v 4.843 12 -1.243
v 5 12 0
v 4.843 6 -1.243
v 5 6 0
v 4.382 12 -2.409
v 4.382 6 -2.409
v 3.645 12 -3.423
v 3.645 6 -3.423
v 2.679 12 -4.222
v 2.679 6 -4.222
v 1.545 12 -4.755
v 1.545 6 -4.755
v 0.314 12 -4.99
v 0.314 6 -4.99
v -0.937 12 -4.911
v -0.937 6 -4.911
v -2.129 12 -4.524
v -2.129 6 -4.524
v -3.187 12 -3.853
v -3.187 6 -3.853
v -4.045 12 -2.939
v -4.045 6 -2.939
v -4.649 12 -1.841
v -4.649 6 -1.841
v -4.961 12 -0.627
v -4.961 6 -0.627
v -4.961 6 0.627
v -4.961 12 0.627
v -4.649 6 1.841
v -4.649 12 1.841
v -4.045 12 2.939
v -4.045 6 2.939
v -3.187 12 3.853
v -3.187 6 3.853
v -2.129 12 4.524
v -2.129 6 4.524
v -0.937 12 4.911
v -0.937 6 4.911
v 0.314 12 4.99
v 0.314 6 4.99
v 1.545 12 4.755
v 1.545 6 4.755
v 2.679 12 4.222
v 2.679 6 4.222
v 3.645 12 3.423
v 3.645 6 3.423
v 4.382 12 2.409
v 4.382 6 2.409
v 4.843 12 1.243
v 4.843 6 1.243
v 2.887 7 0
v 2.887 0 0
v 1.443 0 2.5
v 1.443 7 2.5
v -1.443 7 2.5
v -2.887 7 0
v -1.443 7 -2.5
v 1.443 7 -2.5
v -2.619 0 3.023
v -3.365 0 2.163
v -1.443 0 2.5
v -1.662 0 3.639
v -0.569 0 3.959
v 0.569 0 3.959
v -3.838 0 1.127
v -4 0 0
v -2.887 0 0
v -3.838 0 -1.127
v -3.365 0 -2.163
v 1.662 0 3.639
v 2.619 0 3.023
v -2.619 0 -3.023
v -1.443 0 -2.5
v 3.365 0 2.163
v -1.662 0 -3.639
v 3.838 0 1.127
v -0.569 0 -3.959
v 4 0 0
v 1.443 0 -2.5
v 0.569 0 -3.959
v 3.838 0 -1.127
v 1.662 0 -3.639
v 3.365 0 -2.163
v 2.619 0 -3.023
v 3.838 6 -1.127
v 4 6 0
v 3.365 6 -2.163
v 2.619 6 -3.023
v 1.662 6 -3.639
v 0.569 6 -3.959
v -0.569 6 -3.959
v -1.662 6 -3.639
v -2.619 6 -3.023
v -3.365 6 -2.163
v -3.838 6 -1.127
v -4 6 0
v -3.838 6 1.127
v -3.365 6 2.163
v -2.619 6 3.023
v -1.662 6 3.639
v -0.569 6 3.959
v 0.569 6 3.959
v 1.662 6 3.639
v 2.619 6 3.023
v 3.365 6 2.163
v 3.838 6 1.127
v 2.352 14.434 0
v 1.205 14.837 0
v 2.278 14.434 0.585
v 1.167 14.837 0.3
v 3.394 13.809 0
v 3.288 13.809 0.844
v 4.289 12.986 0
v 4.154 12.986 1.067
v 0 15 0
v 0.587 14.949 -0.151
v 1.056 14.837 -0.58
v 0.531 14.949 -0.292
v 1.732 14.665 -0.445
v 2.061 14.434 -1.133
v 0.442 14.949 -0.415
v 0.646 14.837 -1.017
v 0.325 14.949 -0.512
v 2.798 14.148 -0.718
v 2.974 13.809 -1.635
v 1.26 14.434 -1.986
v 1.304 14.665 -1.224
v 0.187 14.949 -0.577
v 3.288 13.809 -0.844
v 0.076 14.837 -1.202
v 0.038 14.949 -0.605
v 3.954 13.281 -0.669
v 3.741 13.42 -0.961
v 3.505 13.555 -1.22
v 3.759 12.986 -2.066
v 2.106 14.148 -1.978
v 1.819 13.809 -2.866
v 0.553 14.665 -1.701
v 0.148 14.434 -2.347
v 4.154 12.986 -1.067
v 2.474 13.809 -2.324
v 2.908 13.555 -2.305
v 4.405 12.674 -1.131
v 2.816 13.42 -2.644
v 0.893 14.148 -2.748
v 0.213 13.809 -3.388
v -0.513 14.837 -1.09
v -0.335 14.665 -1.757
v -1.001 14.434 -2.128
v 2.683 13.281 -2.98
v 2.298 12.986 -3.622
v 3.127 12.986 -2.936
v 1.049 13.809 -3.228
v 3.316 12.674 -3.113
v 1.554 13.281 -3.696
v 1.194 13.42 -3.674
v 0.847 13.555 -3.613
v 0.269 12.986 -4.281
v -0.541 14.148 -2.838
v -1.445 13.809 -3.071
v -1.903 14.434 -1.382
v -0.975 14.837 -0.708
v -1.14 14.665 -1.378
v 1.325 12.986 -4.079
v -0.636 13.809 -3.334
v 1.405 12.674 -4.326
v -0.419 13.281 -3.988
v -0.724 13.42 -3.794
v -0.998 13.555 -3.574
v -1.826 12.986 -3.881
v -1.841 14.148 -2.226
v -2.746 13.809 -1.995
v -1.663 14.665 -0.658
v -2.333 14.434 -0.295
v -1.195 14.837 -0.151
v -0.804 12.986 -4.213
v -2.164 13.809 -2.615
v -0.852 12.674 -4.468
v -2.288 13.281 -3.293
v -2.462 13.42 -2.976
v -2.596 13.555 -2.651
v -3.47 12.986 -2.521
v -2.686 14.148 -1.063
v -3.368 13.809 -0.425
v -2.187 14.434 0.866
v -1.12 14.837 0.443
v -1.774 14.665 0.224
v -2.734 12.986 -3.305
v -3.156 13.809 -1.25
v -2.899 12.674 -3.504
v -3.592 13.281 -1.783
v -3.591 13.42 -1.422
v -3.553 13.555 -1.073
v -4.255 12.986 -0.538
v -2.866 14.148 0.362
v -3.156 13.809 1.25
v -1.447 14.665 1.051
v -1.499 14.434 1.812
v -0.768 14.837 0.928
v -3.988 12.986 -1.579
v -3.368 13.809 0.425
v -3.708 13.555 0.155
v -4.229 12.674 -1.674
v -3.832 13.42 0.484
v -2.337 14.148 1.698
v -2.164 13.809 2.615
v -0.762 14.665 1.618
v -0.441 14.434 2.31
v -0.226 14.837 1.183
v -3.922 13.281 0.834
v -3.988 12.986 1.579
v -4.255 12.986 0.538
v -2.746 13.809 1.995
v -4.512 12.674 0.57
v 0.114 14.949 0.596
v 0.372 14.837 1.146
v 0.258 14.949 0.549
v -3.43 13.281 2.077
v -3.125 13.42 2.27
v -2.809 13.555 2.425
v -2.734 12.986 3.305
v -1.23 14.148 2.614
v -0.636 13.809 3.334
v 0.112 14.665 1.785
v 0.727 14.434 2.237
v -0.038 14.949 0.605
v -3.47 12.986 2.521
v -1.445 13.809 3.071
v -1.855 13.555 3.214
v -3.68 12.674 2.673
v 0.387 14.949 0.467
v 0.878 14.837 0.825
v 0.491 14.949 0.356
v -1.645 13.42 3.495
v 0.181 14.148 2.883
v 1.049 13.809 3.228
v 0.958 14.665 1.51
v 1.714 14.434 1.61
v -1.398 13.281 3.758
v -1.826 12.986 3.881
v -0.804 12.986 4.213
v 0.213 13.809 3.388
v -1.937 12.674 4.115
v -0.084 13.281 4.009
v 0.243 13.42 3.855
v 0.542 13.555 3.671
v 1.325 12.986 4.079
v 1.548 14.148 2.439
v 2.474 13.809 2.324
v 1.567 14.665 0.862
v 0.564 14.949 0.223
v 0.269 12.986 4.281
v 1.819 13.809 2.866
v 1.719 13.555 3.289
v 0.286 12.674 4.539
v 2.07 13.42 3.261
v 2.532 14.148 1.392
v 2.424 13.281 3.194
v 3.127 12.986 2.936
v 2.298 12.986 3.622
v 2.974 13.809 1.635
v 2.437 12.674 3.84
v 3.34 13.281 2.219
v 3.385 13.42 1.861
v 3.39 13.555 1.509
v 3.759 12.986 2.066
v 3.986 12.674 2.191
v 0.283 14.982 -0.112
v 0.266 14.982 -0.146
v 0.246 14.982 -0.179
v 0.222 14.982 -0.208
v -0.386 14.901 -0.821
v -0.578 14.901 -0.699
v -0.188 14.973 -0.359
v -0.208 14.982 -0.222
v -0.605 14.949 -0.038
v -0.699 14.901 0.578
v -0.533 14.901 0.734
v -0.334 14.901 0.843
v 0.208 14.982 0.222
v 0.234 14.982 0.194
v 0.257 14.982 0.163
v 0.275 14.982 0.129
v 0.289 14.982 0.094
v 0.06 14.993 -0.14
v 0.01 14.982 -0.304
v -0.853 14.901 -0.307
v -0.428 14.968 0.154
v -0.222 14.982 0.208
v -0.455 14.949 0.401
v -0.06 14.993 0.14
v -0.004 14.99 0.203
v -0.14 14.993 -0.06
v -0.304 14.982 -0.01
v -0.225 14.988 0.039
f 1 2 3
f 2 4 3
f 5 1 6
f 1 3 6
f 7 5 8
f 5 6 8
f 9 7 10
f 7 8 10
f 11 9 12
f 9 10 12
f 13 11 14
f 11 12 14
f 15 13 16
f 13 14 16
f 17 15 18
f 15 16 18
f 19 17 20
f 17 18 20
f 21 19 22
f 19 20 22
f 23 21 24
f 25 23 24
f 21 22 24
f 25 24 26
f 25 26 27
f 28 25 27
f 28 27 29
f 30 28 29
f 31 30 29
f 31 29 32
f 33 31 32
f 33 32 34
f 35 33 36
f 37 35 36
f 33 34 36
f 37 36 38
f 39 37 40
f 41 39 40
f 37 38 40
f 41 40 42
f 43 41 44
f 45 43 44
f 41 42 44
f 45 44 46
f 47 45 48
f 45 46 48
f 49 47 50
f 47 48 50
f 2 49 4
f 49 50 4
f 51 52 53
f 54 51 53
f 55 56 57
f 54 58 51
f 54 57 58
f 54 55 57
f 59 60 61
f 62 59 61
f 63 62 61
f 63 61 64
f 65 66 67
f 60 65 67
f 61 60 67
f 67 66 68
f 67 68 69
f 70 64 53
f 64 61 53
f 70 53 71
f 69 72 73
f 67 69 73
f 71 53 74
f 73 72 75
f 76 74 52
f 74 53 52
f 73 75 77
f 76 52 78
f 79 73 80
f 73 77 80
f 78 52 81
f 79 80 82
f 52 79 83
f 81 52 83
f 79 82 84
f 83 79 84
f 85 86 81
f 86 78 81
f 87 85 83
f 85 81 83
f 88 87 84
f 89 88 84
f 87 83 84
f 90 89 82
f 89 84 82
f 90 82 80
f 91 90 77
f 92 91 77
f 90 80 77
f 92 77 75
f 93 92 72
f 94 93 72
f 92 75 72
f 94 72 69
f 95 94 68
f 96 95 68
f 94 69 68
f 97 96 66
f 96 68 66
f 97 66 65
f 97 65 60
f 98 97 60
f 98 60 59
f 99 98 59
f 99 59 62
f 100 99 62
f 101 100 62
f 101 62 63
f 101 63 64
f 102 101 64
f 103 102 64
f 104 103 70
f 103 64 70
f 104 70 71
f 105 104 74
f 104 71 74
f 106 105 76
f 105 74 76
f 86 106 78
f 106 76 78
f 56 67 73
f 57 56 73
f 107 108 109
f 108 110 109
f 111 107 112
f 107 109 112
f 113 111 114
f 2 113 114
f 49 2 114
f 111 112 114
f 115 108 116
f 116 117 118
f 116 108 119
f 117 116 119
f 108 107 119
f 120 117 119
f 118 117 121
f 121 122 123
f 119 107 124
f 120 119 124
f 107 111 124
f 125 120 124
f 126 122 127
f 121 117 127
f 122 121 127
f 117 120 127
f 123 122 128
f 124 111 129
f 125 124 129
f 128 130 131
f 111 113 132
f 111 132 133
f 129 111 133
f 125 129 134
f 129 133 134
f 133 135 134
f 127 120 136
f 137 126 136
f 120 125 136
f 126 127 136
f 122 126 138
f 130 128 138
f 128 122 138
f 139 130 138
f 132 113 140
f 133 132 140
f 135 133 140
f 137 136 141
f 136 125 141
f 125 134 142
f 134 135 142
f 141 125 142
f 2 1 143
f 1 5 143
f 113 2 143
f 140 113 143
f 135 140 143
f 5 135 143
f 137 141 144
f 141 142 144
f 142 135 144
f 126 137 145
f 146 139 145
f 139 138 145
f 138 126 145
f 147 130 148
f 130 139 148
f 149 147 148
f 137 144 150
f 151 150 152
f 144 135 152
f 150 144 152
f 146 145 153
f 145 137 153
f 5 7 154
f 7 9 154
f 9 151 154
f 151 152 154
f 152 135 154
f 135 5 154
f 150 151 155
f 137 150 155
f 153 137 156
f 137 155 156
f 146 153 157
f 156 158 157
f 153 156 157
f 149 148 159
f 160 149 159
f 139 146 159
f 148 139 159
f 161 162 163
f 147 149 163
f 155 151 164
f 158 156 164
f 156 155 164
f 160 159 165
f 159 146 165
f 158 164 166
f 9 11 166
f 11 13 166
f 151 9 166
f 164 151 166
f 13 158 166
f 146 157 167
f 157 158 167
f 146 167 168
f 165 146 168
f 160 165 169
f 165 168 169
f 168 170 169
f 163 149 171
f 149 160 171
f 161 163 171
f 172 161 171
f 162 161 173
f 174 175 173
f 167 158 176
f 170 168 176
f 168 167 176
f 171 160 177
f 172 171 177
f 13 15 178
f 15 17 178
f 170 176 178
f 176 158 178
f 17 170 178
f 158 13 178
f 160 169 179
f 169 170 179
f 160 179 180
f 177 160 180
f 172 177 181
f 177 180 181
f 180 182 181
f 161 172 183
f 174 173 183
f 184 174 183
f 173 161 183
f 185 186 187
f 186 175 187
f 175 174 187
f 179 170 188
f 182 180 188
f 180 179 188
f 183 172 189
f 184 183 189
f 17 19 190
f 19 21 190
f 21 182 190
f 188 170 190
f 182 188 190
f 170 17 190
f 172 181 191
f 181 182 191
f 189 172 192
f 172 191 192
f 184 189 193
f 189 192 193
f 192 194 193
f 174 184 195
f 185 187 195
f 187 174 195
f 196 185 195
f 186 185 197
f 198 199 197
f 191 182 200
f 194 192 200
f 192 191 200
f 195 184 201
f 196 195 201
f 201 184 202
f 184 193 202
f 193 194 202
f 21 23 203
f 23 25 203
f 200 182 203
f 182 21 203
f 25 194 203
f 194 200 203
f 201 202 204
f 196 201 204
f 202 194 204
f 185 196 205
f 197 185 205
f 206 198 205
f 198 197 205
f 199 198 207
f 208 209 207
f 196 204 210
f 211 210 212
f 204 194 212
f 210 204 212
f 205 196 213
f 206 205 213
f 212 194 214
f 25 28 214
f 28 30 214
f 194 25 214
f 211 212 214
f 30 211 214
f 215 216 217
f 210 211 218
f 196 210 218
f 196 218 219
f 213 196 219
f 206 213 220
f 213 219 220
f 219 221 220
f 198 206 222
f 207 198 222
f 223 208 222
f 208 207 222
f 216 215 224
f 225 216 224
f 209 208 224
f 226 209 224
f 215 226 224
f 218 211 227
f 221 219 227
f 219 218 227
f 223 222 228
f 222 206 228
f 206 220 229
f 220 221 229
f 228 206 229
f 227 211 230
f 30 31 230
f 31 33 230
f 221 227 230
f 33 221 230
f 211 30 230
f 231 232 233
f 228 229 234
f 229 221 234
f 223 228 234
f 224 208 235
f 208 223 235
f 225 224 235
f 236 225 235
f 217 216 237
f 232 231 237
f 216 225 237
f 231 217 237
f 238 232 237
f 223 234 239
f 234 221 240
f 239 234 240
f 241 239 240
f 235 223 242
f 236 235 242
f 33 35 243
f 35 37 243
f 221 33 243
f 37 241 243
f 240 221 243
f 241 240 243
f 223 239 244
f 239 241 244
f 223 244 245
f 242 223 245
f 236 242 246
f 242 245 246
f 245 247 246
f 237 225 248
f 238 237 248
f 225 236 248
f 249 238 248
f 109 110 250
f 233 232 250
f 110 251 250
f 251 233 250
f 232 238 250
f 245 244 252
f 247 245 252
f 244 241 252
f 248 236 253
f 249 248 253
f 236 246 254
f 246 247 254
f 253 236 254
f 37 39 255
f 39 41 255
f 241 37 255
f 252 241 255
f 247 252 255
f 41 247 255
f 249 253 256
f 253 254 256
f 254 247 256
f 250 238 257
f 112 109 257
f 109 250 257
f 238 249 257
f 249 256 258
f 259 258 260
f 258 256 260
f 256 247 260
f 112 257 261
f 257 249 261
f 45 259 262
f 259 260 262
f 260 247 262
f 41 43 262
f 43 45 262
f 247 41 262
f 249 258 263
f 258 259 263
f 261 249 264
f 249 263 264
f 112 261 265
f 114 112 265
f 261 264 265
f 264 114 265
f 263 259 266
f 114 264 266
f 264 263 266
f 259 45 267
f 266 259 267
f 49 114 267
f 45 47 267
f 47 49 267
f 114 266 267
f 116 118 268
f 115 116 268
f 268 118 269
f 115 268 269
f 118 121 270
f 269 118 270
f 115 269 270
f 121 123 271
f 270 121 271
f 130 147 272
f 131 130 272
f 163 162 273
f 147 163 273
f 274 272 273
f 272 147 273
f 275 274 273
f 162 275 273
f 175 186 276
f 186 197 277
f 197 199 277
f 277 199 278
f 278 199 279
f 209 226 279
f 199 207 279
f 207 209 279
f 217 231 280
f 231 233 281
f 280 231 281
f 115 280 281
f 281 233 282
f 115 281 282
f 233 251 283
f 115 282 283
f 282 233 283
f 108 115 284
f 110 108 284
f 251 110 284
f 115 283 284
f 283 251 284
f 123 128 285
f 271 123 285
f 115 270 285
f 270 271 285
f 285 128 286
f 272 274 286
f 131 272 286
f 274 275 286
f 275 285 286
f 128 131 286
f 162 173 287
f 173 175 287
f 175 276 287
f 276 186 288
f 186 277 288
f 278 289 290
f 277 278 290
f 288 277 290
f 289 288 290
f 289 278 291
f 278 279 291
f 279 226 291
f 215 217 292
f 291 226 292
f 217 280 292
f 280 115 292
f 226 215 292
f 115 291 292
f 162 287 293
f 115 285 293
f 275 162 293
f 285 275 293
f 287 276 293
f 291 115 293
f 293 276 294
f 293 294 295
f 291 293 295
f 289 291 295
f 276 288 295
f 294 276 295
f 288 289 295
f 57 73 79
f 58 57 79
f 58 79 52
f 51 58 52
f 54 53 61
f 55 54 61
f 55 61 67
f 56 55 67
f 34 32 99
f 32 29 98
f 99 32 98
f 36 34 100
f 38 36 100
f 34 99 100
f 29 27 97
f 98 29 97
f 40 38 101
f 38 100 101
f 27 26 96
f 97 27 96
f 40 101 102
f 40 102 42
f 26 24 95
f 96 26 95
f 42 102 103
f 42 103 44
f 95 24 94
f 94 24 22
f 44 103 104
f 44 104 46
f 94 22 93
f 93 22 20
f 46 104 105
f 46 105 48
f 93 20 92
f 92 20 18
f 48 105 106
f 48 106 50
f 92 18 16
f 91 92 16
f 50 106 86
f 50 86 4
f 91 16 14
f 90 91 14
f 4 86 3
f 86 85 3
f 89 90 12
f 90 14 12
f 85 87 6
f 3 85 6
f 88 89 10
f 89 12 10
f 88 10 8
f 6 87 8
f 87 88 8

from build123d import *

# Parameters (mm, degrees)
CUT_EXTRUDE1_DEPTH = 7


with BuildPart() as part:
    # Sketch1 → Revolve1 (revolve)
    with BuildSketch(Plane.XY):
        with BuildLine():
            Line((0, 0), (0, 15))
            ThreePointArc((0, 15), (2.888936029, 14.148226716), (5, 12))
            Line((5, 12), (5, 6))
            Line((5, 6), (4, 6))
            Line((4, 6), (4, 0))
            Line((4, 0), (0, 0))
        make_face()
    revolve(axis=Axis((0, 0, 0), (0, 1, 0)))

    # Sketch2 → Cut-Extrude1 (cut)
    with BuildSketch(Plane.XZ):
        Polygon((1.443375673, -2.5), (2.886751346, 0), (1.443375673, 2.5), (-1.443375673, 2.5), (-2.886751346, 0), (-1.443375673, -2.5), align=None)
    extrude(amount=-CUT_EXTRUDE1_DEPTH, mode=Mode.SUBTRACT)


solid = part.part
